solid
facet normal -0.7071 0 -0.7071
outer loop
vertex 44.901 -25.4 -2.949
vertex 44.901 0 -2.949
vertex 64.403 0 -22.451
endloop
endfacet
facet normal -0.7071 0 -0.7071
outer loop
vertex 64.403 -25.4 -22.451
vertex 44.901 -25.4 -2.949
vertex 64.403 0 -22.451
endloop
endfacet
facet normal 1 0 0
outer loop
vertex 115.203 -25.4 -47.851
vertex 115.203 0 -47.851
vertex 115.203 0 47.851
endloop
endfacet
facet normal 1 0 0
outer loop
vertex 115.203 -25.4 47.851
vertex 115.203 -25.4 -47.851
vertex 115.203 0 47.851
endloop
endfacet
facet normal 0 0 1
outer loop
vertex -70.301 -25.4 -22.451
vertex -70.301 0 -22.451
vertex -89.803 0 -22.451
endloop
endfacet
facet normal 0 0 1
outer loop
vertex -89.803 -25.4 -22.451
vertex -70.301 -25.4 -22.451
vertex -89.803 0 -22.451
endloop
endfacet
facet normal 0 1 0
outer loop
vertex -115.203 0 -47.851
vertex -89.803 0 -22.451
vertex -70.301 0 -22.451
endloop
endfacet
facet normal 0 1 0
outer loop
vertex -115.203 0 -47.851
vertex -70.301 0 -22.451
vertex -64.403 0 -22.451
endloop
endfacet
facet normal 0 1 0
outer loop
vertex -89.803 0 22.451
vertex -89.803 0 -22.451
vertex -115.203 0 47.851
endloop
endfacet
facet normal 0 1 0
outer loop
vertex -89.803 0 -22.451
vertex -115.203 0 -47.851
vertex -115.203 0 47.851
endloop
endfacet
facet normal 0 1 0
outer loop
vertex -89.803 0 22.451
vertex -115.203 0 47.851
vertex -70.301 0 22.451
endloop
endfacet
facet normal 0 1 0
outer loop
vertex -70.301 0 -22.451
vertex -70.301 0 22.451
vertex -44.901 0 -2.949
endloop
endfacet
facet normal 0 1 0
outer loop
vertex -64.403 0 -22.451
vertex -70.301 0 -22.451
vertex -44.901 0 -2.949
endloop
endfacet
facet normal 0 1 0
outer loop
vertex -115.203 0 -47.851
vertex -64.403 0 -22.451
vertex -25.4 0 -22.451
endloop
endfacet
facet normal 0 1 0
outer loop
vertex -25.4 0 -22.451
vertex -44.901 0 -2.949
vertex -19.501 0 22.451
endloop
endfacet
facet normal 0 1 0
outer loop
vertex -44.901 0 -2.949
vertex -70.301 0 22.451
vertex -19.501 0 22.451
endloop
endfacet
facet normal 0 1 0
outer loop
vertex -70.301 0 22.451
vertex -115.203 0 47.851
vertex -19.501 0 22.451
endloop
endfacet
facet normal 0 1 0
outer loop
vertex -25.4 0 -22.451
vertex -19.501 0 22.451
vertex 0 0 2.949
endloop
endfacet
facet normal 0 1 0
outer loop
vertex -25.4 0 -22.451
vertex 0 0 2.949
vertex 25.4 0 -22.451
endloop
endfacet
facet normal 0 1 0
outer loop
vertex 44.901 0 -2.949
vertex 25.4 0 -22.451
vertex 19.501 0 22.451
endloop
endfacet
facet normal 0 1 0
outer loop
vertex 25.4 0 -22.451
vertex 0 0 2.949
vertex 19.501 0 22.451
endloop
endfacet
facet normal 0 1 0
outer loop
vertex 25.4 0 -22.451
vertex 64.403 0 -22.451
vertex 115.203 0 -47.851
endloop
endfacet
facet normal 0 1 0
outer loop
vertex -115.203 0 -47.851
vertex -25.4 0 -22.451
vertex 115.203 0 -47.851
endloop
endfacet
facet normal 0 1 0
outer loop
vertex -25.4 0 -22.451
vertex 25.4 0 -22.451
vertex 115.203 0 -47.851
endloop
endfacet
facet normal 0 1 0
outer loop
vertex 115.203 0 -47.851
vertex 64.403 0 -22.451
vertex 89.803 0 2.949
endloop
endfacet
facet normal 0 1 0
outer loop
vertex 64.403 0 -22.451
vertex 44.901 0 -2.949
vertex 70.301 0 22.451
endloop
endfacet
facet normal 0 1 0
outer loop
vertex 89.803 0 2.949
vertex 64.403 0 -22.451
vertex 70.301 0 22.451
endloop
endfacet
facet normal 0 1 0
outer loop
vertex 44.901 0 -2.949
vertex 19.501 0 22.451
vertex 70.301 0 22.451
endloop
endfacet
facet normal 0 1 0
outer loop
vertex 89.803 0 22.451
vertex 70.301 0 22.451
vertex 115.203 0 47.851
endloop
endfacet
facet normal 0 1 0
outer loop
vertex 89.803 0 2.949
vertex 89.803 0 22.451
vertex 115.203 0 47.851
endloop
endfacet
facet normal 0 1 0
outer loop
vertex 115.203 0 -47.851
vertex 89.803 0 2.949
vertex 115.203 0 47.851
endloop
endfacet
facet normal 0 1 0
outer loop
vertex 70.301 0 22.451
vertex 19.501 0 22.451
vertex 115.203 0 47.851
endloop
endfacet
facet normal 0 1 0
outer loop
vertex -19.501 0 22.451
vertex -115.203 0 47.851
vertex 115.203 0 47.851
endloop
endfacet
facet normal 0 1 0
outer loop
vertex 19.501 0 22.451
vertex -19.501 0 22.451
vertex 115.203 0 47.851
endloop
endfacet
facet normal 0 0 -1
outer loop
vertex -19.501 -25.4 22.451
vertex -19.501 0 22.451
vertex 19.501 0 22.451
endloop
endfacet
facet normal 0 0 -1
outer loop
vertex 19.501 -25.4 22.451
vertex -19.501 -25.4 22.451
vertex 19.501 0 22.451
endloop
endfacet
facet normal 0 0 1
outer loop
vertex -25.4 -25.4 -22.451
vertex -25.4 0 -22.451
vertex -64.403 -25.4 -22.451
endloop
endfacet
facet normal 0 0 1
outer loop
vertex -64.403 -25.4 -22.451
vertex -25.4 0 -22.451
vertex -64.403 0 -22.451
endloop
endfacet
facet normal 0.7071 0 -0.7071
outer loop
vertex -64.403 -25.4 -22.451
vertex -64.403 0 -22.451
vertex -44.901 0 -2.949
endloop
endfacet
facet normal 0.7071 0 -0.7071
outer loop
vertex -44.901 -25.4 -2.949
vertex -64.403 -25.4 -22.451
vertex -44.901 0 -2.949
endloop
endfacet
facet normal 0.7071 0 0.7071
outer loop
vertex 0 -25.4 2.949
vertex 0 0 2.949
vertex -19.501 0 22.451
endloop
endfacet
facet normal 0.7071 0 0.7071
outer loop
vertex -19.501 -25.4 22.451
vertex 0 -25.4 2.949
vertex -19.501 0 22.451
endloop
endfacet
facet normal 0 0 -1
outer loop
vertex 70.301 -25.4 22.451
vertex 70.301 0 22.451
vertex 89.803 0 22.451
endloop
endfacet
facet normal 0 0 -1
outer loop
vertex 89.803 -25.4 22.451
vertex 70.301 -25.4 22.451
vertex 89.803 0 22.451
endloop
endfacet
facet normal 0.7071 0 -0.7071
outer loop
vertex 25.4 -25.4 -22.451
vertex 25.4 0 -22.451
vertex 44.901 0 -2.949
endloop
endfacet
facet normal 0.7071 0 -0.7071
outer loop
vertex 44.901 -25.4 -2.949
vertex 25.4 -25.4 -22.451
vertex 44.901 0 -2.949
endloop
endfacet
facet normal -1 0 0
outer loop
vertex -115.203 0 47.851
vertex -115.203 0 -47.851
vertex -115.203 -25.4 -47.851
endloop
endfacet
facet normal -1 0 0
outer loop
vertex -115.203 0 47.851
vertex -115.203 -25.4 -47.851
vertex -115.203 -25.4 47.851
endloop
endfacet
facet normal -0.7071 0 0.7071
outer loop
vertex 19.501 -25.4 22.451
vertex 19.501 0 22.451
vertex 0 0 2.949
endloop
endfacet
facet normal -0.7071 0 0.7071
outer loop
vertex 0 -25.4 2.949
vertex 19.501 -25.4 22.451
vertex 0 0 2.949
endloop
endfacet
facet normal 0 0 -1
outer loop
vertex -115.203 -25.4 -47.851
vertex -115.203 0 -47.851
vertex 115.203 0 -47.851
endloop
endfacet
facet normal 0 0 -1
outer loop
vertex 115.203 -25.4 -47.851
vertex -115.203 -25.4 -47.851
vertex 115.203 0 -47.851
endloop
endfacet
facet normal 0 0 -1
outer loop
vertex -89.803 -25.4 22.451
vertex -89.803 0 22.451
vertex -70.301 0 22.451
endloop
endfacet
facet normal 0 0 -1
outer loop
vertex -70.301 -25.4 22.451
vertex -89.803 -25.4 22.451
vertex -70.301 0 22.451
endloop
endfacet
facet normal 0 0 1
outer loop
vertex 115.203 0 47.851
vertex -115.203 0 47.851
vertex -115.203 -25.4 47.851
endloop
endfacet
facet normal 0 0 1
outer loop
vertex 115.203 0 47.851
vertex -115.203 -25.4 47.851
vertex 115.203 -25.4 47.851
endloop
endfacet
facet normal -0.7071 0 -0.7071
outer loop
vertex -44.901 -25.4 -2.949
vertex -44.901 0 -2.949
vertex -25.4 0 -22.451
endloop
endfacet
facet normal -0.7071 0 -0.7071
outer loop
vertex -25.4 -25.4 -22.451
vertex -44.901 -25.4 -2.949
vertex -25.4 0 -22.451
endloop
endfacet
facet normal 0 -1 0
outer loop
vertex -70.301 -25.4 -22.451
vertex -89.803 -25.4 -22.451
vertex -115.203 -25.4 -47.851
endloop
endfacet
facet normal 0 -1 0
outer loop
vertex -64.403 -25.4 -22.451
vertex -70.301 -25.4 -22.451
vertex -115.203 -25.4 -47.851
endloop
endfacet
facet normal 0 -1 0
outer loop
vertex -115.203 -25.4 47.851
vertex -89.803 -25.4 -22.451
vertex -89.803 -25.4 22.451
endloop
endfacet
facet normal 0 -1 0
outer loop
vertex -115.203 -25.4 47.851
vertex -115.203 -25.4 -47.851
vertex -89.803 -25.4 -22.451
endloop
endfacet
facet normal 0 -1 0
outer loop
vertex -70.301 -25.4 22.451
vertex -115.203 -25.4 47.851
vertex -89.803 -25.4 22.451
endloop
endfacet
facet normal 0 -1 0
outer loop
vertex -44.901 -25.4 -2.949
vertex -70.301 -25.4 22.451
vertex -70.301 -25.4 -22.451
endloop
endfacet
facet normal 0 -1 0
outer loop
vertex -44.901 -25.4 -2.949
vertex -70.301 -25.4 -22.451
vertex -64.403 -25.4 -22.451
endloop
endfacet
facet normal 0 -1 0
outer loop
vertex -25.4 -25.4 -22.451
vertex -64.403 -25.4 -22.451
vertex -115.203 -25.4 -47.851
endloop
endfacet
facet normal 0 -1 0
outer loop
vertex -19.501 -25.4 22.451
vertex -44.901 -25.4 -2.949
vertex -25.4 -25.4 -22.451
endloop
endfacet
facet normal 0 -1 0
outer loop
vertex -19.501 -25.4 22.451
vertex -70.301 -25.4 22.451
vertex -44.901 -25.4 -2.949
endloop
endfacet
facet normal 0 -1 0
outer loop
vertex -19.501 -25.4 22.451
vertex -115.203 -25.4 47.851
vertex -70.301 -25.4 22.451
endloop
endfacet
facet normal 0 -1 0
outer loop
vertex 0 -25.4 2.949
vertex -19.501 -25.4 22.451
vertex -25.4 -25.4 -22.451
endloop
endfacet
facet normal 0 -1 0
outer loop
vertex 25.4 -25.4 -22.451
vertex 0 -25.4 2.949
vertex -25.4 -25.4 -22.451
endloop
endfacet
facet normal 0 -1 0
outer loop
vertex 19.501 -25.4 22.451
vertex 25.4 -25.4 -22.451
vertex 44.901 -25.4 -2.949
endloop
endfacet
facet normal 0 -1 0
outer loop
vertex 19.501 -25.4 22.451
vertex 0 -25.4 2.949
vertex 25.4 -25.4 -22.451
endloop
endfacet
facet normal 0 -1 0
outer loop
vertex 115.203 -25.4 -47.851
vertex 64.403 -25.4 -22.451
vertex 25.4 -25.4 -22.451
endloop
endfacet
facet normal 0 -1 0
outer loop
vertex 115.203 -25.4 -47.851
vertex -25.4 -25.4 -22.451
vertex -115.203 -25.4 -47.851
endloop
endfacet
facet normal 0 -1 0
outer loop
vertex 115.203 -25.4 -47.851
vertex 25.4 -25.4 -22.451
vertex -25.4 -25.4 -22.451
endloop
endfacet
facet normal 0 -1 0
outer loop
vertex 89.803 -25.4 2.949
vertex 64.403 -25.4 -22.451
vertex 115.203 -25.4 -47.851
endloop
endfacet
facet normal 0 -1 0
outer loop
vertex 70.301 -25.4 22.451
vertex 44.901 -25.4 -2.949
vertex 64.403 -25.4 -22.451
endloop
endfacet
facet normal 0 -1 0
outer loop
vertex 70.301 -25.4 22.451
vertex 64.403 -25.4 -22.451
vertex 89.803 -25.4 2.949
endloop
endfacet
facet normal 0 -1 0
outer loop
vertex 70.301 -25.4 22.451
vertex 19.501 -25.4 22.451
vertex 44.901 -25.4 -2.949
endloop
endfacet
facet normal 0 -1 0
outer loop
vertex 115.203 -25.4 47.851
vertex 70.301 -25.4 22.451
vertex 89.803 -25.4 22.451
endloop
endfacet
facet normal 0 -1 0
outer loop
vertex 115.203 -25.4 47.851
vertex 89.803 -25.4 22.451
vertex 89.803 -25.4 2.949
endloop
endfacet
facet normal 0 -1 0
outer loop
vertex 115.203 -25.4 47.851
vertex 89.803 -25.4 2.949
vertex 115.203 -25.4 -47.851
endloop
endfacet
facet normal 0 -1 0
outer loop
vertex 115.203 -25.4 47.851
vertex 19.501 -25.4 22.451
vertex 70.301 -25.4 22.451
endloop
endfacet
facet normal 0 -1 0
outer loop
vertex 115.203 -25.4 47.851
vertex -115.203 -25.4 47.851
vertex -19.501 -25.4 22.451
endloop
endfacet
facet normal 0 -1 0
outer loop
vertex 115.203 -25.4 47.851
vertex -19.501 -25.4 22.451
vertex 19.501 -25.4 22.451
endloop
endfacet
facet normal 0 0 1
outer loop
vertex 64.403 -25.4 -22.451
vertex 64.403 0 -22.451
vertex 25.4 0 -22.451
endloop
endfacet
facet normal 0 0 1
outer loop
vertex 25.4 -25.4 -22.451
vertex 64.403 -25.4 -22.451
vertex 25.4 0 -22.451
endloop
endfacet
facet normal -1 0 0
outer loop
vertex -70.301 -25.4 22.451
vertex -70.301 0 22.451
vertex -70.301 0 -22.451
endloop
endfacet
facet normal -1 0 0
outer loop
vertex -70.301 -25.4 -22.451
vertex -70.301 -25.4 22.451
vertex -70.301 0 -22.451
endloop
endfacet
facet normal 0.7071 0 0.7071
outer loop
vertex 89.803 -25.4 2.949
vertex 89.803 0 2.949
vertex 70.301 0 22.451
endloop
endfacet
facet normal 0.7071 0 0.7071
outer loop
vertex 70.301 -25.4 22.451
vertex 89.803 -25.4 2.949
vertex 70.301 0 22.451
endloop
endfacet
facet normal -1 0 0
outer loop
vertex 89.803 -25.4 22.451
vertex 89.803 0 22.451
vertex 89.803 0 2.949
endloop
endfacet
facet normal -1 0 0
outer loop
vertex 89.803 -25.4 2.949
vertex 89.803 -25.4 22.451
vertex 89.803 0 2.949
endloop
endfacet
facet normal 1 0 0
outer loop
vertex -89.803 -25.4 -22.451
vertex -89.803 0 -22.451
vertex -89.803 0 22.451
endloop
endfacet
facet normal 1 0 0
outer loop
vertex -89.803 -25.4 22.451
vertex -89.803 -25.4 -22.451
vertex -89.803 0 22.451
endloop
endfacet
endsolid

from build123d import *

# Parameters (mm, degrees)
F0_W     = 230.405122
F0_H     = 95.70128
F1_DEPTH = 25.4


with BuildPart() as f1:
    # F0 (on Front) → F1 (new body)
    with BuildSketch(Plane.XZ):
        Rectangle(F0_W, F0_H)
        Polygon((-70.301281, -22.45064), (-89.802561, -22.45064), (-89.802561, 2.94936), (-89.802561, 22.45064), (-70.301281, 22.45064), (-44.901281, 22.45064), (-19.501281, 22.45064), (19.501281, 22.45064), (44.901281, 22.45064), (70.301281, 22.45064), (89.802561, 22.45064), (89.802561, 2.94936), (89.802561, -22.45064), (64.402561, -22.45064), (25.4, -22.45064), (0, -22.45064), (-25.4, -22.45064), (-64.402561, -22.45064), align=None, mode=Mode.SUBTRACT)
        Polygon((-70.301281, 22.45064), (-70.301281, -22.45064), (-64.402561, -22.45064), (-44.901281, -2.94936), (-44.901281, 22.45064), align=None)
        Polygon((-44.901281, 22.45064), (-44.901281, -2.94936), (-25.4, -22.45064), (0, -22.45064), (0, 2.94936), (-19.501281, 22.45064), align=None)
        Polygon((0, 2.94936), (0, -22.45064), (25.4, -22.45064), (44.901281, -2.94936), (44.901281, 22.45064), (19.501281, 22.45064), align=None)
        Polygon((44.901281, 22.45064), (44.901281, -2.94936), (64.402561, -22.45064), (89.802561, -22.45064), (89.802561, 2.94936), (70.301281, 22.45064), align=None)
    extrude(amount=F1_DEPTH)


solid = f1.part
